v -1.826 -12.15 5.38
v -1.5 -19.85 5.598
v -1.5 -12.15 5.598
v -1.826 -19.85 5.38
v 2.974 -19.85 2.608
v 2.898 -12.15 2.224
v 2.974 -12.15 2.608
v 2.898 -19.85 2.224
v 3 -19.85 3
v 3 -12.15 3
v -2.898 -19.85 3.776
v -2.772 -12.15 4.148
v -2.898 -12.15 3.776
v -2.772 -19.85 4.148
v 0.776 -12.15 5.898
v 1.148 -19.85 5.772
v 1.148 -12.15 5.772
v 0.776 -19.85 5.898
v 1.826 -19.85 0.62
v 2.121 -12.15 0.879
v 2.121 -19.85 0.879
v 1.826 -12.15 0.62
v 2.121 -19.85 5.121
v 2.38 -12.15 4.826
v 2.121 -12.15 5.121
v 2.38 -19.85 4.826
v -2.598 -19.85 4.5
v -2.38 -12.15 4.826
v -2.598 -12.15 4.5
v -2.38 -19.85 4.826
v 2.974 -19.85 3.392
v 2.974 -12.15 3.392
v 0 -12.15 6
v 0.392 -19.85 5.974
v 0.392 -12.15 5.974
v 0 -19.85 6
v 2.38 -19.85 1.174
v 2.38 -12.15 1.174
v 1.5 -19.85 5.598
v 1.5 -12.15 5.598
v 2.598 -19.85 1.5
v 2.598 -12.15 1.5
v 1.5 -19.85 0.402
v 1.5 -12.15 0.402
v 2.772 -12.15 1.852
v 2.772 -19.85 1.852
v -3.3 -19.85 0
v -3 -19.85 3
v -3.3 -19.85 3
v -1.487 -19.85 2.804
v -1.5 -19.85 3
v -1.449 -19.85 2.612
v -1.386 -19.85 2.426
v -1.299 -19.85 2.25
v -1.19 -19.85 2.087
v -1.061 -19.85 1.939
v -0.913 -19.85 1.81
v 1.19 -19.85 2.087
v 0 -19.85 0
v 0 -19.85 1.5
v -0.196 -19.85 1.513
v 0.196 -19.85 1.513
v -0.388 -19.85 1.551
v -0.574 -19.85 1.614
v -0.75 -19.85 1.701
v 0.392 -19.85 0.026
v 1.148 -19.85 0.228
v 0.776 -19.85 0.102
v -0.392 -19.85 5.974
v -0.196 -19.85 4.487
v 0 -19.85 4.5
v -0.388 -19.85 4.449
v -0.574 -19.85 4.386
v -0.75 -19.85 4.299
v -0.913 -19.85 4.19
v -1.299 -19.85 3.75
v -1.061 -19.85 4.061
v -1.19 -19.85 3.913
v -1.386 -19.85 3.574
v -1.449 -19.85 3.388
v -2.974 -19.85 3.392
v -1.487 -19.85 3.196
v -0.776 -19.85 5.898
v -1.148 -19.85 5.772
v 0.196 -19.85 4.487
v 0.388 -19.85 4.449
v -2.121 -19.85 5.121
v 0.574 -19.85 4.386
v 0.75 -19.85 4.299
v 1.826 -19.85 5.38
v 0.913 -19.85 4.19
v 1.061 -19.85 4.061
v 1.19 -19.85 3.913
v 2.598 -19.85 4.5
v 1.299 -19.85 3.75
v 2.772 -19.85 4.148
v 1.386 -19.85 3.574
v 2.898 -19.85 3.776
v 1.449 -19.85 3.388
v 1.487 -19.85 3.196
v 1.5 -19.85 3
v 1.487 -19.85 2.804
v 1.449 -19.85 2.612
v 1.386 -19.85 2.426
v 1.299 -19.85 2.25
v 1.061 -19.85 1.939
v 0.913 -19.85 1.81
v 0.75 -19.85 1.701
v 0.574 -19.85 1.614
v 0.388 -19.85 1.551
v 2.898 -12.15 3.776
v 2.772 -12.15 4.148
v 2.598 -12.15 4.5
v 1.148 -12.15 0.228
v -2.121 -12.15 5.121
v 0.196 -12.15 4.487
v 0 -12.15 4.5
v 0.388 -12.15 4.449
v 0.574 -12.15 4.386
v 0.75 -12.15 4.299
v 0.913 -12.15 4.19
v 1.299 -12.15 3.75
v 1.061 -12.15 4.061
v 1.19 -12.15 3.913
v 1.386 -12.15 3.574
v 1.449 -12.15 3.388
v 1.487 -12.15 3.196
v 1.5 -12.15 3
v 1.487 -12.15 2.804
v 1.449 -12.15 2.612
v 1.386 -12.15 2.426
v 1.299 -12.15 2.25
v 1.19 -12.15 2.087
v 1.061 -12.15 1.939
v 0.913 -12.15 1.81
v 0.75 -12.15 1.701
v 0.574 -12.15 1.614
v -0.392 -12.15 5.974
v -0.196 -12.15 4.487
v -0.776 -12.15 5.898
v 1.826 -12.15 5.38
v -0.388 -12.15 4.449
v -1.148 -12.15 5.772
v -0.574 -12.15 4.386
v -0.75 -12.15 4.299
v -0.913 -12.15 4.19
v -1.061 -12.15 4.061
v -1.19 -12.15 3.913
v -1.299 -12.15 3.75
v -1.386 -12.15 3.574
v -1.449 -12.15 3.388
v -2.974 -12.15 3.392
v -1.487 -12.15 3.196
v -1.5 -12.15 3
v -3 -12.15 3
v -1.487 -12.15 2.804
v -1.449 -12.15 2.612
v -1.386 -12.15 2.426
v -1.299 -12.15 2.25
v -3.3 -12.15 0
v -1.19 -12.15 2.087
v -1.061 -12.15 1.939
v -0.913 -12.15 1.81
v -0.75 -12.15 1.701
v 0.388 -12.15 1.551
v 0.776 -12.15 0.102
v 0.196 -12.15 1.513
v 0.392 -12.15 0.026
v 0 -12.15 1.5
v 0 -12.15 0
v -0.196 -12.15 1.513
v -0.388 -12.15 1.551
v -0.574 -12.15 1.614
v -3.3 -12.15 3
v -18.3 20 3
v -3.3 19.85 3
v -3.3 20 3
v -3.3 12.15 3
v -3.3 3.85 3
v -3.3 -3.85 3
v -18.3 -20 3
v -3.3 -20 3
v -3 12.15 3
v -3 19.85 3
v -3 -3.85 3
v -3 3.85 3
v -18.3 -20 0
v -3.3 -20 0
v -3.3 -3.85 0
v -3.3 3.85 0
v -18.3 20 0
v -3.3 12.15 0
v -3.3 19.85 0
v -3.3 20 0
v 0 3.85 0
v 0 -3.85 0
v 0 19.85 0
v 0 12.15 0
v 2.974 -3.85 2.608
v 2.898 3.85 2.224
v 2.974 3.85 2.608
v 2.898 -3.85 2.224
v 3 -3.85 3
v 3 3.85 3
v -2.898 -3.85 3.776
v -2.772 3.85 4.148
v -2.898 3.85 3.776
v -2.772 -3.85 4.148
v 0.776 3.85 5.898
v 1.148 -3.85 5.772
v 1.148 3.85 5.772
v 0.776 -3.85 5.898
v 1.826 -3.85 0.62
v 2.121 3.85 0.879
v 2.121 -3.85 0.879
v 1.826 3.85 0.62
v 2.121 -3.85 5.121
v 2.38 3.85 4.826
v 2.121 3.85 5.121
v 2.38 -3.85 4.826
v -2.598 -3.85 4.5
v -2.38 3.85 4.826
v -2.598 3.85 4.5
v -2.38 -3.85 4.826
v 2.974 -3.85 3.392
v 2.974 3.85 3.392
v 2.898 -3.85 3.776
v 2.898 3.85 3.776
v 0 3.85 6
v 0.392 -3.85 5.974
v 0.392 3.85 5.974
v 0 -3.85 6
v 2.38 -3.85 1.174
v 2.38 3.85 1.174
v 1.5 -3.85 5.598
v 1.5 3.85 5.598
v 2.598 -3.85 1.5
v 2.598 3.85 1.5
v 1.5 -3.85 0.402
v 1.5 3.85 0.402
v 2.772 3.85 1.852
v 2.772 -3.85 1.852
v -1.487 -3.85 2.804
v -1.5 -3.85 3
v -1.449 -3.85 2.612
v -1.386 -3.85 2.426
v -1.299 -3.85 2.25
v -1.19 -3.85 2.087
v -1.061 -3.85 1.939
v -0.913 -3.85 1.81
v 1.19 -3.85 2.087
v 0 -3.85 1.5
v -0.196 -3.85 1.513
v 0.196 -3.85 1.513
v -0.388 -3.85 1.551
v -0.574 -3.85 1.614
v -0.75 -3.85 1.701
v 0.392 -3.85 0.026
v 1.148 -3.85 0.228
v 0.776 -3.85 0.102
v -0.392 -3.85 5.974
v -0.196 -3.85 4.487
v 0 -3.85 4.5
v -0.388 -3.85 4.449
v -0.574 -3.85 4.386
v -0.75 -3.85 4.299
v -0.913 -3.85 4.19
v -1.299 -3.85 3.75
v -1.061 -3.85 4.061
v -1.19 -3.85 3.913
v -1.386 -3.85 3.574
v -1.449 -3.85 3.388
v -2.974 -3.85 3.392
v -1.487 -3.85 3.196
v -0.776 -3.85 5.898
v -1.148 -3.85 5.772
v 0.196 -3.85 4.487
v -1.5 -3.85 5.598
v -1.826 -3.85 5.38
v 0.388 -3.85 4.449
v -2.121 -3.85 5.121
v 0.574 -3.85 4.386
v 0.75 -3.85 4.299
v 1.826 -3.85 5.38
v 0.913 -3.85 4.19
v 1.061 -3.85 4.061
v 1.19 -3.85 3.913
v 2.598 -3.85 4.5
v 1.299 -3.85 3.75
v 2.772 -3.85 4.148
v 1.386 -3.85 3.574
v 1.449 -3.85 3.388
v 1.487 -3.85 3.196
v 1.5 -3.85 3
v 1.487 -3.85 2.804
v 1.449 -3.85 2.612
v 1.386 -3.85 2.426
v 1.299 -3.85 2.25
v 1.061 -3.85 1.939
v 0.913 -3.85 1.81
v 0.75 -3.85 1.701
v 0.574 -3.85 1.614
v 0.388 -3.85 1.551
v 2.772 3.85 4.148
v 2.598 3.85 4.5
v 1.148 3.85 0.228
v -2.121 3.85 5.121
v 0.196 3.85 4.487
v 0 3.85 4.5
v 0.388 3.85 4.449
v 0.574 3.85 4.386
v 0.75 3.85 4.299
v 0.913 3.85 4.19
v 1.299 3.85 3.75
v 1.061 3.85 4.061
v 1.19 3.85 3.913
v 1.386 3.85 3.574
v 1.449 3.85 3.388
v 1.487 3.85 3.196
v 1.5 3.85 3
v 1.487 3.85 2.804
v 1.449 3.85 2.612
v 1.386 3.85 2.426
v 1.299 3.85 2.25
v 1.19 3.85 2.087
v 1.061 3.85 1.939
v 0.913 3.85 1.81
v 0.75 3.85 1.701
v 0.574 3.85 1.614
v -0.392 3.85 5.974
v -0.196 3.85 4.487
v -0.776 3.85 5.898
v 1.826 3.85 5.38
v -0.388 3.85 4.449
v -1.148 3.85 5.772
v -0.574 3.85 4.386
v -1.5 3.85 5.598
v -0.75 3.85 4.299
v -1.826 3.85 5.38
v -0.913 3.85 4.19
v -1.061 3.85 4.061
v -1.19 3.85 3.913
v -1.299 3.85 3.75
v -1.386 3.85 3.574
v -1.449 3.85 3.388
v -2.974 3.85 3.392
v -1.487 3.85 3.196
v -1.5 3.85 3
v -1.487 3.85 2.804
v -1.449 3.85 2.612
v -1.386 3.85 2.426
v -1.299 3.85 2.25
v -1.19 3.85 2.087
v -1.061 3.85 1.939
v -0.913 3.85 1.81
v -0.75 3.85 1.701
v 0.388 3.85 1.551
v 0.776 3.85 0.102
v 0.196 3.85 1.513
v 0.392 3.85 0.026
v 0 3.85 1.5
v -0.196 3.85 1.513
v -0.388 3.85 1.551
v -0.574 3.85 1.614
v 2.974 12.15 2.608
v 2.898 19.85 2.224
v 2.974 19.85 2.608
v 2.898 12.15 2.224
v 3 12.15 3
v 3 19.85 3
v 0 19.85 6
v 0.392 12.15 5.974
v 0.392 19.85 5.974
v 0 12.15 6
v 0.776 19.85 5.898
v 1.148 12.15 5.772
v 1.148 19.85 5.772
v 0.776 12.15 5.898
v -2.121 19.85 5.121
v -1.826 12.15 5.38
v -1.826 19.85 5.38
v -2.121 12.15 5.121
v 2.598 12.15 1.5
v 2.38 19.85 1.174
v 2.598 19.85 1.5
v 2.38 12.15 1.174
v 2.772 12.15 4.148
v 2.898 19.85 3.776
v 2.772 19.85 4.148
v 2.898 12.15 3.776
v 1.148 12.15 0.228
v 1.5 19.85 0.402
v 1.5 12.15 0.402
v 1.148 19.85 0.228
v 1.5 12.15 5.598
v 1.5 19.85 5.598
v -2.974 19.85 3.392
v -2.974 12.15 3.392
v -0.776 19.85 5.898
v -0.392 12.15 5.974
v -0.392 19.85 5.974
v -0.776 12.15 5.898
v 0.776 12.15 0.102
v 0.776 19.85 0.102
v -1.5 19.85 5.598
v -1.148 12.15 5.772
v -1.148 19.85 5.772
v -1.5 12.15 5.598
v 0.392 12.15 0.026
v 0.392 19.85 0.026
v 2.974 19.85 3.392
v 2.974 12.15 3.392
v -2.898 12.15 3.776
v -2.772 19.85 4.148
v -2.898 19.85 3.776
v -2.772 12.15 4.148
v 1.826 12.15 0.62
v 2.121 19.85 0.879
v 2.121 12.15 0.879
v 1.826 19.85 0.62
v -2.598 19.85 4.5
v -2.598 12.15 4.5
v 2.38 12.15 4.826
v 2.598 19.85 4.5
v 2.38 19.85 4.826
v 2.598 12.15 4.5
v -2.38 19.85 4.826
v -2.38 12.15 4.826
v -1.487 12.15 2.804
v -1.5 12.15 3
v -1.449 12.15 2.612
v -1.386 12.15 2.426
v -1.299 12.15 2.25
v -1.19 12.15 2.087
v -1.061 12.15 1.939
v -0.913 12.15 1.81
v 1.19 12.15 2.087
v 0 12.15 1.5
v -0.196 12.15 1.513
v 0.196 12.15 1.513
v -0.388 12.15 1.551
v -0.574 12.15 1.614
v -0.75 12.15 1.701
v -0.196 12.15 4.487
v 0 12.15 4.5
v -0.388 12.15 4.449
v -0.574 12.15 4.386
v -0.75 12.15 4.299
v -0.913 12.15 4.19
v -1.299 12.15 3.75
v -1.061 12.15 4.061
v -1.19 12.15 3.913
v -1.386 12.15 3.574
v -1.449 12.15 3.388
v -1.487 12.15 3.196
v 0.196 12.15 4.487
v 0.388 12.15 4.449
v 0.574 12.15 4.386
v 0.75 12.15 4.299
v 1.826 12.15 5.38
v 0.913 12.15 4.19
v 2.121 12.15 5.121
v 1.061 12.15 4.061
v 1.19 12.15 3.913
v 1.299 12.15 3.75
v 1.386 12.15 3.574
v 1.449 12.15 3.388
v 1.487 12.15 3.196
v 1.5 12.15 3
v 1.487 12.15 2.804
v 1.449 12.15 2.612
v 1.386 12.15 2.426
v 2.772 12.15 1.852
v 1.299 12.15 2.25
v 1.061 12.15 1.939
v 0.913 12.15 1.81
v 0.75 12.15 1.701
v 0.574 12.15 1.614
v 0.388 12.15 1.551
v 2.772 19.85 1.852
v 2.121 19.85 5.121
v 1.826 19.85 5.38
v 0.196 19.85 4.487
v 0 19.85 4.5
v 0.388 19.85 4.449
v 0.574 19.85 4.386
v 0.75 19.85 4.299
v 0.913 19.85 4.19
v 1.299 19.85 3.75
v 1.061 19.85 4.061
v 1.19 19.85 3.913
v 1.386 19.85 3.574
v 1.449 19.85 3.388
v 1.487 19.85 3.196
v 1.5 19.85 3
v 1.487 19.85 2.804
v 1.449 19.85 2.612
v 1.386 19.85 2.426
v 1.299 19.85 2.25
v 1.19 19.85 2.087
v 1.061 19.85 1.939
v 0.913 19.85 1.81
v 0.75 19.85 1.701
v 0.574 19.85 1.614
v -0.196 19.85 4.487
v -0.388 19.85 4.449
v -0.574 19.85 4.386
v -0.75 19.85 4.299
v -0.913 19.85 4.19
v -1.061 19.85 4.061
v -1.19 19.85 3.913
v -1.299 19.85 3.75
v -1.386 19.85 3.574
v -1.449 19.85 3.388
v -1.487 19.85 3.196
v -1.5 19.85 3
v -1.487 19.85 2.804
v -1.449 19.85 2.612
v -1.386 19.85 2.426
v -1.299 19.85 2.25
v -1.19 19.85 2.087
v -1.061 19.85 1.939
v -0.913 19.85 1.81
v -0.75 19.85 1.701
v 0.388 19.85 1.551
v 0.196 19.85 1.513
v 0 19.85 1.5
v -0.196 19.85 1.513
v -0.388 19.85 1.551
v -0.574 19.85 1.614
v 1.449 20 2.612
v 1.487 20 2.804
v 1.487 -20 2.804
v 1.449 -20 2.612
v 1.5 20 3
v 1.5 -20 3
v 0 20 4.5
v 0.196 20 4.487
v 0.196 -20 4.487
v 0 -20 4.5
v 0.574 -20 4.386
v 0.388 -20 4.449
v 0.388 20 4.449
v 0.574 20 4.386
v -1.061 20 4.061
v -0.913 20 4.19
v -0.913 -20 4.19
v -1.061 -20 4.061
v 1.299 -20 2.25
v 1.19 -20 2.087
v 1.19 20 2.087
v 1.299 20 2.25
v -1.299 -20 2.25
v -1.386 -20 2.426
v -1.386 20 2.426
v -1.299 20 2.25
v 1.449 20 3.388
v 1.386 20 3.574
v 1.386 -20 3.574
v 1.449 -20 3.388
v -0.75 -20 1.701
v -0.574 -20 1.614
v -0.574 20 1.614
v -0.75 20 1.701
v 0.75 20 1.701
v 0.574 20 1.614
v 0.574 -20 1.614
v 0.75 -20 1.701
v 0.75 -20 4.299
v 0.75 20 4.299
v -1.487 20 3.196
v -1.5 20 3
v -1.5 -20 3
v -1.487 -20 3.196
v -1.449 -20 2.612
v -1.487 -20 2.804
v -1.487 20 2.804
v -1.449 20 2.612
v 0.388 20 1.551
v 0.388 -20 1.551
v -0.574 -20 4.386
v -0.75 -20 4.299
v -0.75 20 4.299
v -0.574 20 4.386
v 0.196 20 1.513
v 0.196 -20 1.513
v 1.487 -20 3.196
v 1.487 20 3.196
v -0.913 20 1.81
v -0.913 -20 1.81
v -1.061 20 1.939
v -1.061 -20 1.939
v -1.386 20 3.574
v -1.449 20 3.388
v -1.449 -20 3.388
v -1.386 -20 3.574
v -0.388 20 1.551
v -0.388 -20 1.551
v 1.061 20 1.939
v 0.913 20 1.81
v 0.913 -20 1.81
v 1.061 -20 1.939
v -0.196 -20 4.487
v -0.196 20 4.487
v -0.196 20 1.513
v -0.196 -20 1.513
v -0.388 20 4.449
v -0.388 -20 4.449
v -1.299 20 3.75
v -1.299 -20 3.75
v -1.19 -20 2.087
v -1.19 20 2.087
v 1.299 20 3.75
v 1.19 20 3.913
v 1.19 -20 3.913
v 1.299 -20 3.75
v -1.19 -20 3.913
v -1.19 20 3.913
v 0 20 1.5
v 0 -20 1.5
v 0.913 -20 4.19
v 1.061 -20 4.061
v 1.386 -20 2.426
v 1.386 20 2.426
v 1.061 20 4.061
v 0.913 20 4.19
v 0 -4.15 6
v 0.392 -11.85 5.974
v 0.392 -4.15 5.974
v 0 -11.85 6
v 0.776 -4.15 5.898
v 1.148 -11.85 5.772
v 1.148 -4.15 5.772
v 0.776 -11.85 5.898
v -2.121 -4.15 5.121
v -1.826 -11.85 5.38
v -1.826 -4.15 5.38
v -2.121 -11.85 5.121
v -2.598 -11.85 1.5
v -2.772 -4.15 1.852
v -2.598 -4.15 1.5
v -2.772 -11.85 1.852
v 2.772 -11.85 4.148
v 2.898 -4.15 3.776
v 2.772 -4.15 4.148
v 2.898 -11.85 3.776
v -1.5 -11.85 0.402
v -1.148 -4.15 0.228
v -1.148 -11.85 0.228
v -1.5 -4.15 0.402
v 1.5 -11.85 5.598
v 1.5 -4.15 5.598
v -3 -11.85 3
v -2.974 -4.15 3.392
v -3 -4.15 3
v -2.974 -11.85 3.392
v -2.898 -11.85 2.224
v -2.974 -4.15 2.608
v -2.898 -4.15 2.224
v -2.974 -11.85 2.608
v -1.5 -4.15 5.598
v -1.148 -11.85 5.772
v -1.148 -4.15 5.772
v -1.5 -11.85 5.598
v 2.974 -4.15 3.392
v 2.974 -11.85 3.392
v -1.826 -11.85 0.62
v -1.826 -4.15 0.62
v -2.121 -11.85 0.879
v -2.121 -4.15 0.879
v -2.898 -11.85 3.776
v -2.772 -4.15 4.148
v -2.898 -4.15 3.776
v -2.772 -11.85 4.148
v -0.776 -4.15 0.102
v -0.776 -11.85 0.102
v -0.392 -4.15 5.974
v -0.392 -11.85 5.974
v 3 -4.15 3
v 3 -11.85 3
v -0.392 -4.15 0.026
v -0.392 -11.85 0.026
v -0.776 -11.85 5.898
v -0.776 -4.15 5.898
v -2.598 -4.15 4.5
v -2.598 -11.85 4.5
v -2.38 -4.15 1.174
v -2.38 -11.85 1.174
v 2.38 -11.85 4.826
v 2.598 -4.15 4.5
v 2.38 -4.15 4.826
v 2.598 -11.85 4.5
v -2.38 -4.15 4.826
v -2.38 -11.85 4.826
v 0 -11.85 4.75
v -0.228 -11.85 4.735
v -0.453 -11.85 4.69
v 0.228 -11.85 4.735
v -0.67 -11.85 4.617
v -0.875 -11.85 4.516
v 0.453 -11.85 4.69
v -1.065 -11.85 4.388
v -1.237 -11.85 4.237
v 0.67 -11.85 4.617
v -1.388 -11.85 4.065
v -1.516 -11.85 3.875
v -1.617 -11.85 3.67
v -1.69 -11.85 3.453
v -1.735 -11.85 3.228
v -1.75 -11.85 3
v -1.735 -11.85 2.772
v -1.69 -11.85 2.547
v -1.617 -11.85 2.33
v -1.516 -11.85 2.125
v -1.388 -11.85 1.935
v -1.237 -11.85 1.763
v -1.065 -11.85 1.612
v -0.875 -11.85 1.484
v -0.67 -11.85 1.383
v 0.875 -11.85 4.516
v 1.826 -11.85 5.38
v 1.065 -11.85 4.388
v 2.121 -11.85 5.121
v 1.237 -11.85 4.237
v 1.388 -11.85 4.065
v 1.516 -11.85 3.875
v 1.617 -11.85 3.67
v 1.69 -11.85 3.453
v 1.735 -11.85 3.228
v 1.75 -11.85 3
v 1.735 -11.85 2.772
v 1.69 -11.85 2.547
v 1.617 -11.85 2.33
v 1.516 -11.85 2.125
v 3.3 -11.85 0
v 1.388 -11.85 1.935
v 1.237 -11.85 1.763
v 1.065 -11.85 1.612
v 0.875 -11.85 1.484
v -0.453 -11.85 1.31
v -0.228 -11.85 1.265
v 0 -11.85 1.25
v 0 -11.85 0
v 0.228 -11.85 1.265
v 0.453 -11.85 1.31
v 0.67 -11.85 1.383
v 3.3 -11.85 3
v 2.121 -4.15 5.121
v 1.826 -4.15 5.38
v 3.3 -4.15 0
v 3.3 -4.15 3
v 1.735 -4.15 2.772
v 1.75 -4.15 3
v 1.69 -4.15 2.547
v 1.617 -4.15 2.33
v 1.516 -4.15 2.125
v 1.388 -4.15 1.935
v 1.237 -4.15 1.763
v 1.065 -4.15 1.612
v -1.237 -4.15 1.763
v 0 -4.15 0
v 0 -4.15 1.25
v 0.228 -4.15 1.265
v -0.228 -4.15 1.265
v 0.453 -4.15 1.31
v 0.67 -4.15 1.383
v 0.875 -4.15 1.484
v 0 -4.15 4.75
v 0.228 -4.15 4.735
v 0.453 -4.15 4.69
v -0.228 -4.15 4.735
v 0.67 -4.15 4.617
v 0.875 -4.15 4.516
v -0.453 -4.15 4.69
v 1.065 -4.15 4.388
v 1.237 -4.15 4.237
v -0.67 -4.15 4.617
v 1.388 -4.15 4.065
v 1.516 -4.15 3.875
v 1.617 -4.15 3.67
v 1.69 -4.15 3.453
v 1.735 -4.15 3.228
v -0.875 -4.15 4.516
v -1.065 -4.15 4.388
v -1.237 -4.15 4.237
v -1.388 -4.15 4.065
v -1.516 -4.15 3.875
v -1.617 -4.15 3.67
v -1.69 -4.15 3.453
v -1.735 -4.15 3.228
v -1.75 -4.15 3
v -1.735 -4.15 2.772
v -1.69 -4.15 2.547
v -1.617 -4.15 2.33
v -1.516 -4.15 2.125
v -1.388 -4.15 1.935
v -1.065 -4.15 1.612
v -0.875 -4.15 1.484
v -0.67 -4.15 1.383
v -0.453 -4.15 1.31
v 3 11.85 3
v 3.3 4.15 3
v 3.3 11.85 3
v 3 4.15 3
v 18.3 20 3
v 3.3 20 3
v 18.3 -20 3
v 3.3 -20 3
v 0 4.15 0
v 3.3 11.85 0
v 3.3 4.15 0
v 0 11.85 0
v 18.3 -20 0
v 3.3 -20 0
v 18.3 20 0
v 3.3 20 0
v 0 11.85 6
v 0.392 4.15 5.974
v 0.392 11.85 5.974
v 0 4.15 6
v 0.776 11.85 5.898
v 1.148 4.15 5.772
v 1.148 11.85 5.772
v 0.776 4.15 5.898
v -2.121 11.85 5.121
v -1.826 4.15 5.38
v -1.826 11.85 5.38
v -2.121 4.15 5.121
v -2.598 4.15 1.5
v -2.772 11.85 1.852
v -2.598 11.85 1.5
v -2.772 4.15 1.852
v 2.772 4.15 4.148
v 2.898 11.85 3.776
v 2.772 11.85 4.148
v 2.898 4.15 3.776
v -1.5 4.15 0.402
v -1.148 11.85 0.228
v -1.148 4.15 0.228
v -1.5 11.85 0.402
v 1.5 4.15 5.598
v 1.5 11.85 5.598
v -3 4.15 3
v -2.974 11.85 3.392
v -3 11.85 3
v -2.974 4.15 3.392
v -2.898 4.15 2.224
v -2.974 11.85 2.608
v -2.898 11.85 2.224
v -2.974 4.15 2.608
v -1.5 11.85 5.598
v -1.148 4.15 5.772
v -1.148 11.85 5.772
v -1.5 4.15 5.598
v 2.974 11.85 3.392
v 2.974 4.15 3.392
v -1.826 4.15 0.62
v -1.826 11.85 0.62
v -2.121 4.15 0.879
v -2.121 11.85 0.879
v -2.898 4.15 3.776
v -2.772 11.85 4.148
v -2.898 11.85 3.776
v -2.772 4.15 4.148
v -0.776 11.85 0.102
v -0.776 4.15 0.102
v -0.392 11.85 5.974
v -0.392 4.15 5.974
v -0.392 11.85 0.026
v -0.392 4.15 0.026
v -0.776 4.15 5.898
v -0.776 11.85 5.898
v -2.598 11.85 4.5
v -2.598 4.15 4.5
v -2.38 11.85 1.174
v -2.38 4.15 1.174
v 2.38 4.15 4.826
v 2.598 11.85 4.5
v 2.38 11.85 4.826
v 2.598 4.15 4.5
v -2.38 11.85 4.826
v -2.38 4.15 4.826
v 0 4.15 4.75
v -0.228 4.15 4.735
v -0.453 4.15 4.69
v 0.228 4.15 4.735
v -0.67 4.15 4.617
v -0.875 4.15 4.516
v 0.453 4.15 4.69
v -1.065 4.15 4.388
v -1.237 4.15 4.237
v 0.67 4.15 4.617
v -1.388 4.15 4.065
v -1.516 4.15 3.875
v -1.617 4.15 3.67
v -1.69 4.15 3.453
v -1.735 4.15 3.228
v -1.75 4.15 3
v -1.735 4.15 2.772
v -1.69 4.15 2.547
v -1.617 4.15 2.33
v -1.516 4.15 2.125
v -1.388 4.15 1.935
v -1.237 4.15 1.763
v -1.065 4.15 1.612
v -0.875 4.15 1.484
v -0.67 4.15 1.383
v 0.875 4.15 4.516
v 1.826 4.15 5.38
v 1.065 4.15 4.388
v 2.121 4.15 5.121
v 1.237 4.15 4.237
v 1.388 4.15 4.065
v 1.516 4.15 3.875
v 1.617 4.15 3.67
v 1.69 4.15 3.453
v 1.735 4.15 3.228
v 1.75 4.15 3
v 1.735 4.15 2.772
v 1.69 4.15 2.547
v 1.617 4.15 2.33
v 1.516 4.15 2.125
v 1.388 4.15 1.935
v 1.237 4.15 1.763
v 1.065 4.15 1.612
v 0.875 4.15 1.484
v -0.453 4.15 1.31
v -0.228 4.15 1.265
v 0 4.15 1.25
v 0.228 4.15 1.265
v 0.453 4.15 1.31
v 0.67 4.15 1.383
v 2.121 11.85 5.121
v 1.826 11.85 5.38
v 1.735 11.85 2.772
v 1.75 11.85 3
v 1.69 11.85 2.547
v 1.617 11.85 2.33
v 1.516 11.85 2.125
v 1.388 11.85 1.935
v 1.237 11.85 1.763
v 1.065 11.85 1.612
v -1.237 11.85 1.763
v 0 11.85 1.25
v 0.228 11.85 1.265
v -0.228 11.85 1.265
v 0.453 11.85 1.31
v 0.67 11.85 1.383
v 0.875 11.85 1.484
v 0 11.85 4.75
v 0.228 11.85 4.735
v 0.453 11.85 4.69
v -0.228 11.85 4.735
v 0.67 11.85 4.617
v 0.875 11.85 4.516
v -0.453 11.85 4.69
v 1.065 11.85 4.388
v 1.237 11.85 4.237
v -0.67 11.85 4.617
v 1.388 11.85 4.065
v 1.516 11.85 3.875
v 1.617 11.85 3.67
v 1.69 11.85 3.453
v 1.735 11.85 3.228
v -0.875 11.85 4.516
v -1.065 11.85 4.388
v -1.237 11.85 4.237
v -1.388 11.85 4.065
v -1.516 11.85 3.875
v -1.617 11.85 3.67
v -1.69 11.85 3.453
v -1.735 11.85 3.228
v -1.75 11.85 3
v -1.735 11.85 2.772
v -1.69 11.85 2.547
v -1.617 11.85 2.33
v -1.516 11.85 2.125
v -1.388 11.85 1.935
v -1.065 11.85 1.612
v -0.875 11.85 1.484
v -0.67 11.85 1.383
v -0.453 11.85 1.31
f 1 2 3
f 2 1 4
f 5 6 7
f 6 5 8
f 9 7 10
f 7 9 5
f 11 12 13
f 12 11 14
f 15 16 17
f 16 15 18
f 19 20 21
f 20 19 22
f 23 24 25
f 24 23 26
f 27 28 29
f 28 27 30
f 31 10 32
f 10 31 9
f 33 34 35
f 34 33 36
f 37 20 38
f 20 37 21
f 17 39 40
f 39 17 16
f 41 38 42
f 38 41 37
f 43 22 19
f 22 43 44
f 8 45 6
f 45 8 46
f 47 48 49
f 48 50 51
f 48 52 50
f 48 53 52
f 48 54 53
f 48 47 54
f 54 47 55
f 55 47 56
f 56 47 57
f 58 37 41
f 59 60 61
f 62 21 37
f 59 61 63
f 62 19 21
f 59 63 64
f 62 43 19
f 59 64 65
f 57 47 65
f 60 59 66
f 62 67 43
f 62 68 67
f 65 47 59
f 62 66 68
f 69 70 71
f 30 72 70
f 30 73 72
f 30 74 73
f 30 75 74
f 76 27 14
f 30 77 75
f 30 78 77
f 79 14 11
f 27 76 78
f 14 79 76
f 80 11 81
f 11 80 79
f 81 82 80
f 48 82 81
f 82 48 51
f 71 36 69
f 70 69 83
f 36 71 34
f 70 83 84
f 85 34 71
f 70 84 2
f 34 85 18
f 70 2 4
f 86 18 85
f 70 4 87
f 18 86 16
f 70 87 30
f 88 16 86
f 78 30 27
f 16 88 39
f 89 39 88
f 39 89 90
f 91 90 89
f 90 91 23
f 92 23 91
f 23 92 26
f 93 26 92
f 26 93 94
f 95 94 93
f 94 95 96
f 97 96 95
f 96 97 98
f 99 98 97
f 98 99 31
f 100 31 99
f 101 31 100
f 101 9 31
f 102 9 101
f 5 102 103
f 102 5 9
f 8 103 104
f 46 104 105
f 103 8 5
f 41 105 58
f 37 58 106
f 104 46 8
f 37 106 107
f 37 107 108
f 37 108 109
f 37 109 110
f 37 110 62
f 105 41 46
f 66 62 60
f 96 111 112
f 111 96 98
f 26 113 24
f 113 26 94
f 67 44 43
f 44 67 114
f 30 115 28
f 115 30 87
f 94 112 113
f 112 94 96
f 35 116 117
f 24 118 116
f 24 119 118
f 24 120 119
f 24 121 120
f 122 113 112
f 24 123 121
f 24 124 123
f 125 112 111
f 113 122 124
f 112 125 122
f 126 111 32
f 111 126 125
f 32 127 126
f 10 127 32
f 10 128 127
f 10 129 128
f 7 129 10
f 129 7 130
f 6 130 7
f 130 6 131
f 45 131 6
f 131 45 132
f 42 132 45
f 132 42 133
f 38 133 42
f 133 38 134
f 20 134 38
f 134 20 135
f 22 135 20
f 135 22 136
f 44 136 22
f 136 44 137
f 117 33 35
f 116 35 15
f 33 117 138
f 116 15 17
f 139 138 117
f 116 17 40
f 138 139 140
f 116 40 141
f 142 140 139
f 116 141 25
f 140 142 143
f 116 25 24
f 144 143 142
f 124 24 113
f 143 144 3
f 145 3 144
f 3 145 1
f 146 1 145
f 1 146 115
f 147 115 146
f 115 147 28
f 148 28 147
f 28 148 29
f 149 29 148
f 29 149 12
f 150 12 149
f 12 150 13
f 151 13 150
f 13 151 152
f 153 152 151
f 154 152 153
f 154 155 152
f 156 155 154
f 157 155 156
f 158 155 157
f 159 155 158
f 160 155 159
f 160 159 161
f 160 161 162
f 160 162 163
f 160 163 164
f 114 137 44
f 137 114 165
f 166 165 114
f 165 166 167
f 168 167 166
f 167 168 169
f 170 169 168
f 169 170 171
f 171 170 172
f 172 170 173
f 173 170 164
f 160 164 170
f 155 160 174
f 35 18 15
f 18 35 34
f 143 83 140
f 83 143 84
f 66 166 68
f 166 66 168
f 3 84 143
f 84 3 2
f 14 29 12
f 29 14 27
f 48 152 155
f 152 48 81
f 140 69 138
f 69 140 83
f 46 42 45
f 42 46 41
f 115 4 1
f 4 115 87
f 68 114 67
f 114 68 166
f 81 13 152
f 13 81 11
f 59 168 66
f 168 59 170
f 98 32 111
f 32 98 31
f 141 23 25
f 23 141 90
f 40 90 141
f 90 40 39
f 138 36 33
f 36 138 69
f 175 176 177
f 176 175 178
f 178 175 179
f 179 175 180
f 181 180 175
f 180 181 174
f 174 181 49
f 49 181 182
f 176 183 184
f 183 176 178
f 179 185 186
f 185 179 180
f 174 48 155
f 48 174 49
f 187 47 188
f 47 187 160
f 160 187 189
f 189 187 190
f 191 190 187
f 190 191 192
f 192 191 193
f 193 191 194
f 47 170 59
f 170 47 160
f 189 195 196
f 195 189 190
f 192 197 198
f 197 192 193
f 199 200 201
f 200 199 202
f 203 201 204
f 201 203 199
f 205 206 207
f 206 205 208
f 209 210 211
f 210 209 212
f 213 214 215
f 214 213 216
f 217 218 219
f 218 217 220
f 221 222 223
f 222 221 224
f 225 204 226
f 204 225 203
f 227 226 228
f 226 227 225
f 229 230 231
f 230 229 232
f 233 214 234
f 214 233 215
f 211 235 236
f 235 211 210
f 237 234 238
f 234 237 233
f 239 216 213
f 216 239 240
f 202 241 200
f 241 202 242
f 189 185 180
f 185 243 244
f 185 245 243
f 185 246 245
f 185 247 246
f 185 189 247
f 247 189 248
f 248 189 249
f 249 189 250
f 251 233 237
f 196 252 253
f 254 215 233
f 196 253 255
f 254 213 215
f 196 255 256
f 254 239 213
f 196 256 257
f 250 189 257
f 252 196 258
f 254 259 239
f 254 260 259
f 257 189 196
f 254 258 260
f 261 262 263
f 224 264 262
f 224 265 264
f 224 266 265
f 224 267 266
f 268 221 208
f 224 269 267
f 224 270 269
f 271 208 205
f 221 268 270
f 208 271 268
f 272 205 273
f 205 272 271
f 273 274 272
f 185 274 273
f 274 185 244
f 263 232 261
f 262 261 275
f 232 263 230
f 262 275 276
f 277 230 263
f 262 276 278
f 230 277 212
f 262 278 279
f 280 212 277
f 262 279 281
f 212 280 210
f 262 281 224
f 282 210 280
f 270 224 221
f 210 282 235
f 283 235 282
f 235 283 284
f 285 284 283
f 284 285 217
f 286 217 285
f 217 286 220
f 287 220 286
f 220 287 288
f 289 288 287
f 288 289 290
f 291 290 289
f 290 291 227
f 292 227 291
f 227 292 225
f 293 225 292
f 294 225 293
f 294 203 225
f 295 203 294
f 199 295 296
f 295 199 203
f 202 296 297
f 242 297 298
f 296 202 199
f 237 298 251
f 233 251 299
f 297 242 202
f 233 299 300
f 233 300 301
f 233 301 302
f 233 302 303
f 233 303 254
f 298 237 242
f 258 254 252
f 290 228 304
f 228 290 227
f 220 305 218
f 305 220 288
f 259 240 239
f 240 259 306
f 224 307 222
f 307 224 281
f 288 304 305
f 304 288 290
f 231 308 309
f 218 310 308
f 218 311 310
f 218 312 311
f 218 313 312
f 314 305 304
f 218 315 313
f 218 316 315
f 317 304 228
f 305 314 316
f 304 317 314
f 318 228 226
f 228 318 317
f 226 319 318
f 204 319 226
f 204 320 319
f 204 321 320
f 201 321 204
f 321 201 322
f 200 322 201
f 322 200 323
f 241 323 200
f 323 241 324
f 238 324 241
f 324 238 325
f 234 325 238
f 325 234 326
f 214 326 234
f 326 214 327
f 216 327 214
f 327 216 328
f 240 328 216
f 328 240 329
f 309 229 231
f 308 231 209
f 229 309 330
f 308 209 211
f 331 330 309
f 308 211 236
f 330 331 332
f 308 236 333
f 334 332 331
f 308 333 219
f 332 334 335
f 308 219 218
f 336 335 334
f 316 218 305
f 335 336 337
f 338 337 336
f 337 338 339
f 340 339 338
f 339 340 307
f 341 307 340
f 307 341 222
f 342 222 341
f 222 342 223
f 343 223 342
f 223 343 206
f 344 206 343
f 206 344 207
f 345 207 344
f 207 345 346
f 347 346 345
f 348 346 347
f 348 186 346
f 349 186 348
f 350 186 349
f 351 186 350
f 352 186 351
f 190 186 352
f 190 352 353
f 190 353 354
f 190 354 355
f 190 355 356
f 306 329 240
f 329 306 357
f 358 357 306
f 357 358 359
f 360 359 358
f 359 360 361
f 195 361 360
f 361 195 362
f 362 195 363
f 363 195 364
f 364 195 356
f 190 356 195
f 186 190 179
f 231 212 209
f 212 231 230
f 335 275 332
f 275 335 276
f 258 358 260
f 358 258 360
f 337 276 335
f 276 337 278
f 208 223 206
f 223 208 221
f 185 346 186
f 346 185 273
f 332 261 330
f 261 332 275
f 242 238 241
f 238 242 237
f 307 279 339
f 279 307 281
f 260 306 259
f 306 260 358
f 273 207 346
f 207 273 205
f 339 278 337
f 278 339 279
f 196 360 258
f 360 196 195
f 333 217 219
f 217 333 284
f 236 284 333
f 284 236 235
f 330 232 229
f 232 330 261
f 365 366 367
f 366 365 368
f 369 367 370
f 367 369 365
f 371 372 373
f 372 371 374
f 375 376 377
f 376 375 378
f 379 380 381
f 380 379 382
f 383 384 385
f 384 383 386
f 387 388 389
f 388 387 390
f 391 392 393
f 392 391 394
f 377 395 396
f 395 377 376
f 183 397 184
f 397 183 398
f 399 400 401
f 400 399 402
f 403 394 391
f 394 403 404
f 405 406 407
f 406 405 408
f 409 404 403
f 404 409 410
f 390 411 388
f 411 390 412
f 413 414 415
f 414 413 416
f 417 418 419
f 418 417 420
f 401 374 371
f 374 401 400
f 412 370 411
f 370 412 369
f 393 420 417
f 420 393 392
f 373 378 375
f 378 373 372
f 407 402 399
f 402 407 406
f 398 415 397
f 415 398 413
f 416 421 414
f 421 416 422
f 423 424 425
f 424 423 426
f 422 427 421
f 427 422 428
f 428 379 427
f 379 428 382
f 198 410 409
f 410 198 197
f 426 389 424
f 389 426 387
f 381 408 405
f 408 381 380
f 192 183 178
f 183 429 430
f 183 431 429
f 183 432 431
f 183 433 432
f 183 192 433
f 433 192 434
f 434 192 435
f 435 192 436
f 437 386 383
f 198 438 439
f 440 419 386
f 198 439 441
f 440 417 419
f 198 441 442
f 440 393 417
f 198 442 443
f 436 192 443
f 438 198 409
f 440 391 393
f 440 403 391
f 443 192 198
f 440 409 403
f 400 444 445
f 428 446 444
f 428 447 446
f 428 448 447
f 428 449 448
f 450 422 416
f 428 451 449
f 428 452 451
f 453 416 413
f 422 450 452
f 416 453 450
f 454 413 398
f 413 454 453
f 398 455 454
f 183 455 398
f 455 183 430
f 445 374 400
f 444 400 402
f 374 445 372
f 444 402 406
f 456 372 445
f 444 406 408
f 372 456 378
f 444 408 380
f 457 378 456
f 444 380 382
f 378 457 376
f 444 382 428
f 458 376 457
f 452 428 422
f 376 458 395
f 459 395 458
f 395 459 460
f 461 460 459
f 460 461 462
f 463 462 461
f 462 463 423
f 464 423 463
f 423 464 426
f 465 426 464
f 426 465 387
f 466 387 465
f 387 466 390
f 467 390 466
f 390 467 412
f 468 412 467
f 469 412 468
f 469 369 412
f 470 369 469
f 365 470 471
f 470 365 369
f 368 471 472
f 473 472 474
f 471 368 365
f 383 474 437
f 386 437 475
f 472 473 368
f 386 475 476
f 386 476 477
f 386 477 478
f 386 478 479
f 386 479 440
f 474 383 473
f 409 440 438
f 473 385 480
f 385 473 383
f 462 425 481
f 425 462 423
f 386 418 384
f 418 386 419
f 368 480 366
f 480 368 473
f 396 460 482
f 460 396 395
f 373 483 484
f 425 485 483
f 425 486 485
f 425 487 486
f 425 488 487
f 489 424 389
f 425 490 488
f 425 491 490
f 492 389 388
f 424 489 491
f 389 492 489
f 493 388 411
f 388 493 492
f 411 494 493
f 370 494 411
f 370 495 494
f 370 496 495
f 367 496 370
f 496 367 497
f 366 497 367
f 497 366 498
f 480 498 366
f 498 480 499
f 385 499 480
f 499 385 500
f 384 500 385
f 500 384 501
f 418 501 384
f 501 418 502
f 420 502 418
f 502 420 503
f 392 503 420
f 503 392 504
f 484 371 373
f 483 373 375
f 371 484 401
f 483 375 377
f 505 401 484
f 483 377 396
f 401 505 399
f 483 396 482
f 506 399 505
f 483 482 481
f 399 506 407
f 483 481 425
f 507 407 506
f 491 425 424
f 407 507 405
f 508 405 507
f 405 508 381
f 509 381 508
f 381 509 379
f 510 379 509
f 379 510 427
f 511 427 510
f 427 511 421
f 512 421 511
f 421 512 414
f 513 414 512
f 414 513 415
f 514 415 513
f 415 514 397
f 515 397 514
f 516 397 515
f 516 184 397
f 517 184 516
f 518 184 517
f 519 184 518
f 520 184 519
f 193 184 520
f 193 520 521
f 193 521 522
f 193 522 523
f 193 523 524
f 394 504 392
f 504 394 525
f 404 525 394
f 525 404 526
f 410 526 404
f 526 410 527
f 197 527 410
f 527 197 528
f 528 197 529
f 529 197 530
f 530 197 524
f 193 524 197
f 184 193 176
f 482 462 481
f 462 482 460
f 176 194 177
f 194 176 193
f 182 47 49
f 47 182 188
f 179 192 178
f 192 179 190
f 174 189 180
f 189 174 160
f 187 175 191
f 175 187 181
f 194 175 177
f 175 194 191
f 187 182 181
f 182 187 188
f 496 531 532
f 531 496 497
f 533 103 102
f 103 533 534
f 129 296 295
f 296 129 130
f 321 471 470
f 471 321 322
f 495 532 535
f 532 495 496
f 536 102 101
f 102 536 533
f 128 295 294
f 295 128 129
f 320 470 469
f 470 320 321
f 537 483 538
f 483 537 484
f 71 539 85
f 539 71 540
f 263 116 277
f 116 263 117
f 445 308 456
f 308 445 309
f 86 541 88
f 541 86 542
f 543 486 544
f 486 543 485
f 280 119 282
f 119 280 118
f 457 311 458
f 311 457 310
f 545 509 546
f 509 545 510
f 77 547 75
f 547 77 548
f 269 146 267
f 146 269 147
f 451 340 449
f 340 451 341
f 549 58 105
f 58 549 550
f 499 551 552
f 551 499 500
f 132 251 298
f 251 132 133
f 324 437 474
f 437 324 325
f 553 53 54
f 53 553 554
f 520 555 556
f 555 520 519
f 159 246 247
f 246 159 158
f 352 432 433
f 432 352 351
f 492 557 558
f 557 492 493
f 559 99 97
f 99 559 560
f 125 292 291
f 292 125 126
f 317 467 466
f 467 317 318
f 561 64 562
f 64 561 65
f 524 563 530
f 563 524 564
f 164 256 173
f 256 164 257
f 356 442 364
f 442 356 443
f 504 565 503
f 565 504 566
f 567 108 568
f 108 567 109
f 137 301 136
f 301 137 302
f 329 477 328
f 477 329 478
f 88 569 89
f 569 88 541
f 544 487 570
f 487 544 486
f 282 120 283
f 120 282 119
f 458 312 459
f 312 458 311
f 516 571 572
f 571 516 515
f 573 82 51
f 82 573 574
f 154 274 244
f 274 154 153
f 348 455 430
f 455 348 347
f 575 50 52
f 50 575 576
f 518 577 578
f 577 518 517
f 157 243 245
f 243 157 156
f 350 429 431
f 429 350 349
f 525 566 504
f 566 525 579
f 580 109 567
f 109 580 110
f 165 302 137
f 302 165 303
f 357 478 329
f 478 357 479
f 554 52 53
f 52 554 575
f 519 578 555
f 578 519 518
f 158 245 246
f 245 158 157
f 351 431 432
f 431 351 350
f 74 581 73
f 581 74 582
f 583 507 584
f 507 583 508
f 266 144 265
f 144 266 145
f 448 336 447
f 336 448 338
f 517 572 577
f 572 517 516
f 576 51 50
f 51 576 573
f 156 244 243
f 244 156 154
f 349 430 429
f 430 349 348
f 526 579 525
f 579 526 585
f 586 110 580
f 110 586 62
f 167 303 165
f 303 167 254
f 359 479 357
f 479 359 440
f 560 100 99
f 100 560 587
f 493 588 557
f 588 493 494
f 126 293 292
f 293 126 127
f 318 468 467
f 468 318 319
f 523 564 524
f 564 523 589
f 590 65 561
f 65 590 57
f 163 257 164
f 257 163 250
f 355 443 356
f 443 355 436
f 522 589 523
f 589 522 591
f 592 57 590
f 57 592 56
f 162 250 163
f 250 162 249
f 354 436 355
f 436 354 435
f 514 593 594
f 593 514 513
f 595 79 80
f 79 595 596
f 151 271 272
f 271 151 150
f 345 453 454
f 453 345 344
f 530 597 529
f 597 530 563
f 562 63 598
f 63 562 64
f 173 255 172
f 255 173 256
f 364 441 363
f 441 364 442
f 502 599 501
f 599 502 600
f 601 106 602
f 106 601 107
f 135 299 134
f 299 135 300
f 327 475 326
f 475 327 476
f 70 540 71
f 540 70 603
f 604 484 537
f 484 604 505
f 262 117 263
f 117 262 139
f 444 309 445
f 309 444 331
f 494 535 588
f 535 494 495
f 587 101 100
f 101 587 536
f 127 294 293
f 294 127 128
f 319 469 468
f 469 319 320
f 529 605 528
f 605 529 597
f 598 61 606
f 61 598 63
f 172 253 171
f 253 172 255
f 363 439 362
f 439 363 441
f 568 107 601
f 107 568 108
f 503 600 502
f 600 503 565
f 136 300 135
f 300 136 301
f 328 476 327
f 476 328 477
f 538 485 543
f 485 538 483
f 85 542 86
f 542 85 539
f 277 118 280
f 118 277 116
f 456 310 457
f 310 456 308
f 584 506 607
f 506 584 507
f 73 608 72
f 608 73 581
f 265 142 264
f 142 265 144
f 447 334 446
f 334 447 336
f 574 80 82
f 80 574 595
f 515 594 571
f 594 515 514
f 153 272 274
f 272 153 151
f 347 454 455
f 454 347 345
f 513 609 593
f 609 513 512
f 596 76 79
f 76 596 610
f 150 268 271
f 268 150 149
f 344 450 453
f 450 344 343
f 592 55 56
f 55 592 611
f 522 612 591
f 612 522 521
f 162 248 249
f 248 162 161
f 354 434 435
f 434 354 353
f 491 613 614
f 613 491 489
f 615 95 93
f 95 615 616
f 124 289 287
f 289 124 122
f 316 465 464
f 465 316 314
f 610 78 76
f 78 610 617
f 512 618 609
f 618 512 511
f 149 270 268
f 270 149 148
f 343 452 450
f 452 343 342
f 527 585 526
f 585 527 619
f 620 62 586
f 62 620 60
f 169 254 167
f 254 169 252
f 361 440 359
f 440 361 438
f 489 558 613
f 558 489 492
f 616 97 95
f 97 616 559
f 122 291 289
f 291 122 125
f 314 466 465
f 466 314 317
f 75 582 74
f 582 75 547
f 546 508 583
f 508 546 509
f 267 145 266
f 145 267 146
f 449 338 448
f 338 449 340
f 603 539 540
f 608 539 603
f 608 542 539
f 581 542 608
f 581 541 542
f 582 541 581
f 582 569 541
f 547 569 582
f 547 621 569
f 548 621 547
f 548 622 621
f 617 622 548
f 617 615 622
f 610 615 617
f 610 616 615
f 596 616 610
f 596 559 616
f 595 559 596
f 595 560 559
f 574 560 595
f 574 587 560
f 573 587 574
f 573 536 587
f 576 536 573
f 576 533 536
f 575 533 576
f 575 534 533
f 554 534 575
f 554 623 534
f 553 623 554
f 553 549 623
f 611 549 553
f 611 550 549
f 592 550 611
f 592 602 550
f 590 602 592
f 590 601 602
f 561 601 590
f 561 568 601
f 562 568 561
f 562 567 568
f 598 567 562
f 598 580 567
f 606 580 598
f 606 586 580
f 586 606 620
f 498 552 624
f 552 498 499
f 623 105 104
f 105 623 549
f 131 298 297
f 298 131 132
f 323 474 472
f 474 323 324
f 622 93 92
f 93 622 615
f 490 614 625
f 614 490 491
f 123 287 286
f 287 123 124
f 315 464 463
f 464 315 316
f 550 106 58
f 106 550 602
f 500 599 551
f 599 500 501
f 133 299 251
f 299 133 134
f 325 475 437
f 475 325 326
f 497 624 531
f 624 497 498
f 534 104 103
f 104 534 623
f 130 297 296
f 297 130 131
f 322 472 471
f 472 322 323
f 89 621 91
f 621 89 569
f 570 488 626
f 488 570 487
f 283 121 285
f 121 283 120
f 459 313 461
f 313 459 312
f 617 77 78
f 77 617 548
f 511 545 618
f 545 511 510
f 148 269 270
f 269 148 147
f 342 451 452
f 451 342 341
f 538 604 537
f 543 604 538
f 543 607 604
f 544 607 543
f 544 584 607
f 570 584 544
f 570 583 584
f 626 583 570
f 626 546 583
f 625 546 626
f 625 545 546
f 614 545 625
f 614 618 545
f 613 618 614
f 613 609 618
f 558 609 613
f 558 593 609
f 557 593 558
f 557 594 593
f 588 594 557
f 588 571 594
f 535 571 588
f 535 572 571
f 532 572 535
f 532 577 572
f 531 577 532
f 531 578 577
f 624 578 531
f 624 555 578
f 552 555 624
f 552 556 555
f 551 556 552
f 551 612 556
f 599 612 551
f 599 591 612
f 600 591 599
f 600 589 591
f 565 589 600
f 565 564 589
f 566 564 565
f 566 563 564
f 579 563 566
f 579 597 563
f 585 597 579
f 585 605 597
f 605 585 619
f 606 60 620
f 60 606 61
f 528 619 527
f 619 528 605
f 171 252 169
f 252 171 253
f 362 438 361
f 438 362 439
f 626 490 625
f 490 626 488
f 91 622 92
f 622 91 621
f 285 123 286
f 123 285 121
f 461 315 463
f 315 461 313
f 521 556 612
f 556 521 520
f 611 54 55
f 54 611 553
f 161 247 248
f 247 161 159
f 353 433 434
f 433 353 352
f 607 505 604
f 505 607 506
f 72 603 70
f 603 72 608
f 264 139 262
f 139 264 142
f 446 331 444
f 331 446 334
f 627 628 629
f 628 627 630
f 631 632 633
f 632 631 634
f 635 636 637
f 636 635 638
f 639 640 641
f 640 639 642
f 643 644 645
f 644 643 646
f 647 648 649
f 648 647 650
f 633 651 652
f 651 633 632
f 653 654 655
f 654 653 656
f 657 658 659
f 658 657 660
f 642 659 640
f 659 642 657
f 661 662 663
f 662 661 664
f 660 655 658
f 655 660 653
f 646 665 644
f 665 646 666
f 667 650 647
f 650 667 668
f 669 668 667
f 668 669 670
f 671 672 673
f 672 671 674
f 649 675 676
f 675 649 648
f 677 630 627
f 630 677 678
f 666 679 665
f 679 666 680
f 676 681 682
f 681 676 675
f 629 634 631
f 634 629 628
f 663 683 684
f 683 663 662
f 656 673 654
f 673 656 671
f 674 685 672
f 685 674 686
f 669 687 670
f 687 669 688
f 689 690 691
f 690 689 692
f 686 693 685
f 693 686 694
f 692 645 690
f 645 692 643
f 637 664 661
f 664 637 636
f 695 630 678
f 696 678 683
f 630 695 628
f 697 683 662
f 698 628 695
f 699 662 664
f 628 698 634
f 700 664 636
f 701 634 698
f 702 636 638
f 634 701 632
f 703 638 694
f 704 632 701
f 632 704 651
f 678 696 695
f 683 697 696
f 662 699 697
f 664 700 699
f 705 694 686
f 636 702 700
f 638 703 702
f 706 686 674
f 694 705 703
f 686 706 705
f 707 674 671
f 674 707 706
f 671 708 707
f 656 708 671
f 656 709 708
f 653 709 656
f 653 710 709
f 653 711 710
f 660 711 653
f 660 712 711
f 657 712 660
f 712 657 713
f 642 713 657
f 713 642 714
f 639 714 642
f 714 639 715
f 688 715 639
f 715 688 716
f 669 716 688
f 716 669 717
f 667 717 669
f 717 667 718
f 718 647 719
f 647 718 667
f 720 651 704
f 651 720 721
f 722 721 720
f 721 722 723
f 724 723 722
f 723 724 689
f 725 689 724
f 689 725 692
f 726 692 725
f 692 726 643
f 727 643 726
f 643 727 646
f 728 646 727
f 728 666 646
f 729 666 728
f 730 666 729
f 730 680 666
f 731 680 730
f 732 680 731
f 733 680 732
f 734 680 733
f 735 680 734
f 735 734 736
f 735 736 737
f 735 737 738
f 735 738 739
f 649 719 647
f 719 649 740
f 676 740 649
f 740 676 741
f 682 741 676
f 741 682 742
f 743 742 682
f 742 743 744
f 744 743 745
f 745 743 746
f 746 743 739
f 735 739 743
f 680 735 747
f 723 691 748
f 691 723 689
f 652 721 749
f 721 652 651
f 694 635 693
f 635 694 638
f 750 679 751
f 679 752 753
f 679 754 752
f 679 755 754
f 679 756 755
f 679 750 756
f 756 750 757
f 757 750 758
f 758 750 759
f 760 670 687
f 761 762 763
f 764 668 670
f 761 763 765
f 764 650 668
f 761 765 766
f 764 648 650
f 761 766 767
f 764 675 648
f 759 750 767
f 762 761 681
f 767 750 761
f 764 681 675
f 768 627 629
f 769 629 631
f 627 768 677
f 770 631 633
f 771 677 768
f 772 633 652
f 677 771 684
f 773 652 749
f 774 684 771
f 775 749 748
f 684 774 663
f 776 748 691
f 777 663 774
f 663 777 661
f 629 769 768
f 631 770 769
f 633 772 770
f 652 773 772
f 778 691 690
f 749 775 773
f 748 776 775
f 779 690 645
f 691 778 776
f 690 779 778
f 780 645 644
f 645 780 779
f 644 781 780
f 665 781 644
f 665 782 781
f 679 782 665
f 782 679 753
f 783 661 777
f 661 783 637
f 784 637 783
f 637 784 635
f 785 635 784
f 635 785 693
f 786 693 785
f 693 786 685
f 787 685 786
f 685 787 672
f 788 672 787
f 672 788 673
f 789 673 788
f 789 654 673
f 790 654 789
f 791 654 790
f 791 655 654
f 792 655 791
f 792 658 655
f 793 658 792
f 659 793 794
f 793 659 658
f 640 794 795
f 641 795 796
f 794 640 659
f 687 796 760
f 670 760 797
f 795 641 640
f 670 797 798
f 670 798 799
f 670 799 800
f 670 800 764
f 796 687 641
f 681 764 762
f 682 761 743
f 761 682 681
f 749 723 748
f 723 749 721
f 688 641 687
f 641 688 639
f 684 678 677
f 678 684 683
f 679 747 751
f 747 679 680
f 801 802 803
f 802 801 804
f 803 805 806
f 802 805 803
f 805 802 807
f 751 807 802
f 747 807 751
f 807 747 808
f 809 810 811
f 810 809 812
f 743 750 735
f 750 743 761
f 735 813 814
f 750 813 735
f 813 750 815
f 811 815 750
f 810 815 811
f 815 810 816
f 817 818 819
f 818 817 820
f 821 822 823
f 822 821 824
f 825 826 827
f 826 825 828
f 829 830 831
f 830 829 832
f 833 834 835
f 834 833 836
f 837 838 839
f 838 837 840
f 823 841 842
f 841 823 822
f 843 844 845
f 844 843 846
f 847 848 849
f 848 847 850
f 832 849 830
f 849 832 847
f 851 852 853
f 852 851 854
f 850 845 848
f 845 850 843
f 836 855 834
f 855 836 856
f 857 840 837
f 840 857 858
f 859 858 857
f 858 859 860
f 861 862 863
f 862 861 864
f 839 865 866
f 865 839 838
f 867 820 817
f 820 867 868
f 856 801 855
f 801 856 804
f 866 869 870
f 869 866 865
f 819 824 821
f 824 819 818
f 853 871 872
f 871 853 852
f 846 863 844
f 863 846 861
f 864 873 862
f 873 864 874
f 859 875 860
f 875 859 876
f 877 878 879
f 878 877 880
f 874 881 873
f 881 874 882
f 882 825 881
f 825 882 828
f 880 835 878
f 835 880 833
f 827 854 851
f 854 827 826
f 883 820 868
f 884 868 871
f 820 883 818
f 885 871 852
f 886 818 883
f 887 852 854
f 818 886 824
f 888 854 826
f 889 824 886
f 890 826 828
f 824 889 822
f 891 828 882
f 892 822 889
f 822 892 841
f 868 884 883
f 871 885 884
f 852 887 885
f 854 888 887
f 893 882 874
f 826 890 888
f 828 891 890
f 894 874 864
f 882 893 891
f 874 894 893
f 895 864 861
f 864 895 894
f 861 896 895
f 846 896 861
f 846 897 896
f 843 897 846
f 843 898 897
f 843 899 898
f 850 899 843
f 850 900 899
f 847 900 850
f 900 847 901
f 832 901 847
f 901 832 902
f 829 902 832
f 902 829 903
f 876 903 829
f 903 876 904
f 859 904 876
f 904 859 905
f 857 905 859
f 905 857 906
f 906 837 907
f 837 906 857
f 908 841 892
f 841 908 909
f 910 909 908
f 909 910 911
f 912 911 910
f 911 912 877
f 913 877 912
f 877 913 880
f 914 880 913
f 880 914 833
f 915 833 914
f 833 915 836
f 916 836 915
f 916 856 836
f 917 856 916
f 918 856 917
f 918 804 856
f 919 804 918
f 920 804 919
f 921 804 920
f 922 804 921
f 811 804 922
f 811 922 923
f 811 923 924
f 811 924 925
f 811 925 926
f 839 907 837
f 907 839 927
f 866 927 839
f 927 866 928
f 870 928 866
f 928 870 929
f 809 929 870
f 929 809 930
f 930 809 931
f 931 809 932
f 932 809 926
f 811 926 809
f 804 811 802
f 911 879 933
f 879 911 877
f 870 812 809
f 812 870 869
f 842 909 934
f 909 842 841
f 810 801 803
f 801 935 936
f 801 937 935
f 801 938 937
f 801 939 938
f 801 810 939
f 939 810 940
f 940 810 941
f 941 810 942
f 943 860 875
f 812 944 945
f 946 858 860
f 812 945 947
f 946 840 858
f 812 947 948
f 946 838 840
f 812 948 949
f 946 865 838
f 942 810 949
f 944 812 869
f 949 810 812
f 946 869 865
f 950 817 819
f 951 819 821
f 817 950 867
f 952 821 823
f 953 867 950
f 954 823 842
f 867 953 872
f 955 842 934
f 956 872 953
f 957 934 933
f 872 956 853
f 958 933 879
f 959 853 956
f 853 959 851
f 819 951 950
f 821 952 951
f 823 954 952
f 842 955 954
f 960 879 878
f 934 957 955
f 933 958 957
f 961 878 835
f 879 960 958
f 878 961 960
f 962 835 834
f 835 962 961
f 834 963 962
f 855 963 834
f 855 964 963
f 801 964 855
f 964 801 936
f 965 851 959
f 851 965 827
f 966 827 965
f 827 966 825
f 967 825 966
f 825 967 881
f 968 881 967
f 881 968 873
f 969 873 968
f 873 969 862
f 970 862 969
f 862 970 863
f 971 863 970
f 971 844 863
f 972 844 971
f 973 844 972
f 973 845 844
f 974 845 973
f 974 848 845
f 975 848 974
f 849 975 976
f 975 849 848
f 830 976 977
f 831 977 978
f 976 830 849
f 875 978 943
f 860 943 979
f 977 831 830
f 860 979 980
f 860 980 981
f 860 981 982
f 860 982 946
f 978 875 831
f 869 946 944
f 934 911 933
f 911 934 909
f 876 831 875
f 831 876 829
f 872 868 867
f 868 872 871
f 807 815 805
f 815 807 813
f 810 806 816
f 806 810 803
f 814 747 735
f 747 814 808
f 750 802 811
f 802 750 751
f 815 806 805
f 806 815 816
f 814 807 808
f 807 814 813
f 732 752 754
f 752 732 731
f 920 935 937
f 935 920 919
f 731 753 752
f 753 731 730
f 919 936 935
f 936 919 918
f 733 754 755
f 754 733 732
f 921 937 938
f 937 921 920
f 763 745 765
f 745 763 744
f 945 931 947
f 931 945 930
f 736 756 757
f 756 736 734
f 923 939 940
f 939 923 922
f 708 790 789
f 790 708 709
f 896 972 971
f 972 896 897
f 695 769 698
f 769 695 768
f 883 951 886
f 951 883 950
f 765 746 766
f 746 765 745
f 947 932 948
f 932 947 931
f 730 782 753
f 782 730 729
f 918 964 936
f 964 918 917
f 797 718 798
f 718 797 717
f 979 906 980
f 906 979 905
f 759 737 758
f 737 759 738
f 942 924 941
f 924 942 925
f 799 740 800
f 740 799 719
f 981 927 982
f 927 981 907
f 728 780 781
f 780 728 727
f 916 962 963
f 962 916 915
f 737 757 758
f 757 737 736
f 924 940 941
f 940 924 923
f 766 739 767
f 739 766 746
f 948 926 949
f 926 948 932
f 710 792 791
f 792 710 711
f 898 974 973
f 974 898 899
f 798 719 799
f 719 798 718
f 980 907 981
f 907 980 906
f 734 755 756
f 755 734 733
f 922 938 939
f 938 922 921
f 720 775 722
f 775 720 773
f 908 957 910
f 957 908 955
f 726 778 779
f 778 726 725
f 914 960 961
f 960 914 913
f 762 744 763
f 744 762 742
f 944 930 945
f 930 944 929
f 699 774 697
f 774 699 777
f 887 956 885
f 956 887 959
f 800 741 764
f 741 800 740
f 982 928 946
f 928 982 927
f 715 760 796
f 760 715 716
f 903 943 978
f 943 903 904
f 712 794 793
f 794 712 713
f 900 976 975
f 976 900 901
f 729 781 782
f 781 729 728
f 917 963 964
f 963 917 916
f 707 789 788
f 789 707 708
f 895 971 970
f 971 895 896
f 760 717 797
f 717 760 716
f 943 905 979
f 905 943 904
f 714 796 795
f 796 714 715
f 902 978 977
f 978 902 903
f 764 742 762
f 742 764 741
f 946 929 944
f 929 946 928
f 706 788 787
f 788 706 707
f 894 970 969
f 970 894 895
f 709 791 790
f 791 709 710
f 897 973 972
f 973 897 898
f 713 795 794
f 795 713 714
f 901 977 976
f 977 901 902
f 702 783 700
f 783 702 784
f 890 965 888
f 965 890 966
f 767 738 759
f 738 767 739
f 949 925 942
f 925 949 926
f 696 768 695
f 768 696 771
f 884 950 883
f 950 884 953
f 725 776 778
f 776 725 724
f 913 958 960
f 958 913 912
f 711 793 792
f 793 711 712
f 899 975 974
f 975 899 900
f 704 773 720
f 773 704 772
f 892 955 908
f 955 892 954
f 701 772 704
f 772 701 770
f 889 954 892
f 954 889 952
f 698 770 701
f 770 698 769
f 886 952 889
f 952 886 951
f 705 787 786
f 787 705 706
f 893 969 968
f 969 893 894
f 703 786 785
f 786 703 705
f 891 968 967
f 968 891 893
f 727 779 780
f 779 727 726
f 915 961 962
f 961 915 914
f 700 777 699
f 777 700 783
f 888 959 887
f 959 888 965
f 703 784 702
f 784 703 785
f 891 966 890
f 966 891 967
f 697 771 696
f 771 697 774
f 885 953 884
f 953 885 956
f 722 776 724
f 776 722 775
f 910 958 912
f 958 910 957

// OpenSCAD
include <../hinge_library.scad>

knuckle_hinge(
    leaf_length    = 40,
    leaf_width     = 15,
    leaf_thickness = 3,
    knuckle_od     = 6,
    knuckle_count  = 5,
    pin_clearance  = 0.25,
    integral_pin   = true
);
